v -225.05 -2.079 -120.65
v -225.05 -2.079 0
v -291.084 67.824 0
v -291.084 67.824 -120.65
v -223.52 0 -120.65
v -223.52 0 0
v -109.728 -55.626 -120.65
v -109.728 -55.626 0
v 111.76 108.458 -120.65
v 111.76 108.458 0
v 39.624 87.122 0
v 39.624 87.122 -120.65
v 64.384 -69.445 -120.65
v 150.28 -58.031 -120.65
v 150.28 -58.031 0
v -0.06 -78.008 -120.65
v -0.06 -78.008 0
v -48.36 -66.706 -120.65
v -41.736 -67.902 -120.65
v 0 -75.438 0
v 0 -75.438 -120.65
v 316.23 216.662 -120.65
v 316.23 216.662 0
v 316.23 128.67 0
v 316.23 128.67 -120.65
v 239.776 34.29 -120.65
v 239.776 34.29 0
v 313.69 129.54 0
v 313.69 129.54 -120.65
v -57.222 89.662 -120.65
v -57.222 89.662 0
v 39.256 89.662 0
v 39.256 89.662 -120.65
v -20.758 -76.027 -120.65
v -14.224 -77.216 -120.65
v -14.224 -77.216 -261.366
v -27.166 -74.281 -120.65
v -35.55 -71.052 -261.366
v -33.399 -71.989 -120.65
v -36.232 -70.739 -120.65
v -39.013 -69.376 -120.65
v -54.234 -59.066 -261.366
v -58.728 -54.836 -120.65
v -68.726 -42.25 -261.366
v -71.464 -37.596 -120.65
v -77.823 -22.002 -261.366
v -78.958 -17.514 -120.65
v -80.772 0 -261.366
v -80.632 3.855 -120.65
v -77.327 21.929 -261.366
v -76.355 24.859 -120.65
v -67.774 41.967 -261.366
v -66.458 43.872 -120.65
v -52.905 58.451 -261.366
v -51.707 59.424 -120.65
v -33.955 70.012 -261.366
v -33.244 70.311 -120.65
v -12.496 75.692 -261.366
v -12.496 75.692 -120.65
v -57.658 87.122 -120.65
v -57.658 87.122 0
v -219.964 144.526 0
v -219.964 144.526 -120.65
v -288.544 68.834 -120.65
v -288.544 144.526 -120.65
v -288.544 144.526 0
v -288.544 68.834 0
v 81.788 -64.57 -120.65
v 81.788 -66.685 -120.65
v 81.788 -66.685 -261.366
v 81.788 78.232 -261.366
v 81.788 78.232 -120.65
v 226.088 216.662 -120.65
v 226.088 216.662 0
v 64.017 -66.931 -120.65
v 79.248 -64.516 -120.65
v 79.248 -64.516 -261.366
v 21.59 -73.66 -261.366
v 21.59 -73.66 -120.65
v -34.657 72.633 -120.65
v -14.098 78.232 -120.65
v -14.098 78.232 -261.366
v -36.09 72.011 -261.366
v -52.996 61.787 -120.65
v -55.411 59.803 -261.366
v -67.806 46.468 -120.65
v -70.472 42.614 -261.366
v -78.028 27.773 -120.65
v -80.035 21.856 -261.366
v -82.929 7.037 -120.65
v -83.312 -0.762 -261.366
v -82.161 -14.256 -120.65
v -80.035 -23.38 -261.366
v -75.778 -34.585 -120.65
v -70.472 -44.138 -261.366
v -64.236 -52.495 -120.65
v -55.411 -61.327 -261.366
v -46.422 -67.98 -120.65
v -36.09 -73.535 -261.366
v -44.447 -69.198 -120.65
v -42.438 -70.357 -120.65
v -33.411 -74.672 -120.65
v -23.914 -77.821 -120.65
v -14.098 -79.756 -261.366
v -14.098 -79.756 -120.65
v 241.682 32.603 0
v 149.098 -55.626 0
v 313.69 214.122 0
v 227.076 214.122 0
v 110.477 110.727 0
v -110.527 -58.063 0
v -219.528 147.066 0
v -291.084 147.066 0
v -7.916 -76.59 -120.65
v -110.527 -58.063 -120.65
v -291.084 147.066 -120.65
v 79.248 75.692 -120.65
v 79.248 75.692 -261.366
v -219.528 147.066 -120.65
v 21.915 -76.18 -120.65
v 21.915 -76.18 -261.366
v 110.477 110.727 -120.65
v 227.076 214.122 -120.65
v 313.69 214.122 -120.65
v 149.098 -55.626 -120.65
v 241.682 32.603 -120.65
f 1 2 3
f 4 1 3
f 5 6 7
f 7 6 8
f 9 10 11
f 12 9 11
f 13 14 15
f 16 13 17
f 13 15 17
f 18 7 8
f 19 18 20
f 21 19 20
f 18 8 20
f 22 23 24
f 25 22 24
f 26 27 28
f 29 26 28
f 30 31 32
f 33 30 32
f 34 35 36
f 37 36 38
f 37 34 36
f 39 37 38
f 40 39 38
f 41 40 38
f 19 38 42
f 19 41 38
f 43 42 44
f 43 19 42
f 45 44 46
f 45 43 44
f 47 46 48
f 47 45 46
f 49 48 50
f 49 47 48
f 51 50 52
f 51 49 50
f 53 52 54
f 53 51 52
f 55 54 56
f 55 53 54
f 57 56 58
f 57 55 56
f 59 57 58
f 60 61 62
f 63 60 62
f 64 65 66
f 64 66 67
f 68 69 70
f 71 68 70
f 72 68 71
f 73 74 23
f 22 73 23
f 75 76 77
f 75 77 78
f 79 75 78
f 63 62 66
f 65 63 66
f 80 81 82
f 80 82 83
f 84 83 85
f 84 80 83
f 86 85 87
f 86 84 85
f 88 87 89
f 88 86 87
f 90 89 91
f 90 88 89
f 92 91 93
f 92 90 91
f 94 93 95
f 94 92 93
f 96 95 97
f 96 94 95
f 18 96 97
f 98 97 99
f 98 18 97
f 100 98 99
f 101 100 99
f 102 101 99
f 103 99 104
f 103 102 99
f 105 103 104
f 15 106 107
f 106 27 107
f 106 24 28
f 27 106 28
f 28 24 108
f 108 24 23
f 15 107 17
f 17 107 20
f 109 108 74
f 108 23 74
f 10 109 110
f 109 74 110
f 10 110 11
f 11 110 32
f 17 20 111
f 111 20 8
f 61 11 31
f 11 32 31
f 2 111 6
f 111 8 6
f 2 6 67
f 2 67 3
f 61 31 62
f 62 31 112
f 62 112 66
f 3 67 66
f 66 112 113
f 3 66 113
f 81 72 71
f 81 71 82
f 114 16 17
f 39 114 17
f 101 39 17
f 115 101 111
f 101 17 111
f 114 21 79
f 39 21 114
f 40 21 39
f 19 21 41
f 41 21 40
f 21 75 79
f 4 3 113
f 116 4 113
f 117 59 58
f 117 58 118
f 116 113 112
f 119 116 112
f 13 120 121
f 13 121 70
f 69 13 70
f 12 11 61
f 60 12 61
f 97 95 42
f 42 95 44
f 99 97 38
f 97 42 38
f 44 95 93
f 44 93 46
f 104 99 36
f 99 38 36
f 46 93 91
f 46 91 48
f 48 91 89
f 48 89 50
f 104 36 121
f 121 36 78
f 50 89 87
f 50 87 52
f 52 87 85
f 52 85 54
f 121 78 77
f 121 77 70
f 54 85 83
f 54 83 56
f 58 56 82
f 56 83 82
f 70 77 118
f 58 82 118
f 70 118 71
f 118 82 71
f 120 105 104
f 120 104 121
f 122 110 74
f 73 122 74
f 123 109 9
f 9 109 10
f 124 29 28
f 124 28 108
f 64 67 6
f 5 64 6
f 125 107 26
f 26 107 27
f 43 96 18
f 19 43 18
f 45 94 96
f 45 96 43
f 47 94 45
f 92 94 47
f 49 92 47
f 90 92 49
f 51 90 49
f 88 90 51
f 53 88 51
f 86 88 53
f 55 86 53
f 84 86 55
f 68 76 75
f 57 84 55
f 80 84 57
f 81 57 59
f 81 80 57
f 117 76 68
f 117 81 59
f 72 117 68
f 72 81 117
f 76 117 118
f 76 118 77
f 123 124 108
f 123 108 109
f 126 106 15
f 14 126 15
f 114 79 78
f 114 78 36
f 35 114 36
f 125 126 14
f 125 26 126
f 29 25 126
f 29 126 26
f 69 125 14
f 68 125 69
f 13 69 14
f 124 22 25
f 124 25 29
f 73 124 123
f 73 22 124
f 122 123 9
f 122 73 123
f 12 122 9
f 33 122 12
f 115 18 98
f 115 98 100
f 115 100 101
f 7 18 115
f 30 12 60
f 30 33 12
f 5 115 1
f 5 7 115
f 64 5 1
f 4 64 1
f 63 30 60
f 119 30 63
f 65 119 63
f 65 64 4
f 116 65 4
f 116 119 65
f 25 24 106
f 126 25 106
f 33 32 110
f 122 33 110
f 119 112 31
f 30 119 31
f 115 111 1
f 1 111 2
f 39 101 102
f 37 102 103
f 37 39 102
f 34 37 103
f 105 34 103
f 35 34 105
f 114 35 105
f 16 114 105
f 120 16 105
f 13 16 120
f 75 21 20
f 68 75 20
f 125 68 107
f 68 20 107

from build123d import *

# Parameters (mm, degrees)
BOSS_EXTRUDE1_DEPTH = 120.65
BOSS_EXTRUDE2_DEPTH = 140.716


with BuildPart() as part:
    # Sketch1 → Boss-Extrude1 (new body)
    with BuildSketch(Plane.XY):
        Polygon((-291.084, 147.066), (-219.52806053, 147.066), (-57.22206053, 89.662), (39.256240725, 89.662), (110.476764153, 110.727225239), (226.088273147, 216.662), (316.23, 216.662), (316.23, 128.670079749), (241.68157023, 32.602515613), (150.279663639, -58.03130773), (-0.059802851, -78.008272613), (-110.526524053, -58.062892396), (-225.049772802, -2.07942928), (-291.084, 67.823990918), align=None)
        Polygon((111.76, 108.458), (39.624, 87.122), (-57.658, 87.122), (-219.964, 144.526), (-288.544, 144.526), (-288.544, 68.834), (-223.52, 0), (-109.728, -55.626), (0, -75.438), (149.098, -55.626), (239.776, 34.29), (313.69, 129.54), (313.69, 214.122), (227.076, 214.122), align=None, mode=Mode.SUBTRACT)
    extrude(amount=-BOSS_EXTRUDE1_DEPTH)

    # Sketch2 → Boss-Extrude2 (add)
    with BuildSketch(Plane(origin=(0, 0, -120.65), x_dir=(-1, 0, 0), z_dir=(0, 0, -1))):
        with BuildLine():
            Line((-81.788, 78.232), (14.098209979, 78.232))
            ThreePointArc((14.098209979, 78.232), (83.312, -0.762), (14.098209979, -79.756))
            Line((14.098209979, -79.756), (-21.914681881, -76.180251872))
            Line((-21.914681881, -76.180251872), (-81.788, -66.684923888))
            Line((-81.788, -66.684923888), (-81.788, 78.232))
        make_face()
        with BuildLine():
            Line((-79.248, 75.692), (-79.248, -64.516))
            Line((-79.248, -64.516), (-21.59, -73.66))
            Line((-21.59, -73.66), (14.224, -77.216))
            ThreePointArc((14.224, -77.216), (80.772, 0), (12.495590487, 75.692))
            Line((12.495590487, 75.692), (-79.248, 75.692))
        make_face(mode=Mode.SUBTRACT)
    extrude(amount=BOSS_EXTRUDE2_DEPTH)


solid = part.part
